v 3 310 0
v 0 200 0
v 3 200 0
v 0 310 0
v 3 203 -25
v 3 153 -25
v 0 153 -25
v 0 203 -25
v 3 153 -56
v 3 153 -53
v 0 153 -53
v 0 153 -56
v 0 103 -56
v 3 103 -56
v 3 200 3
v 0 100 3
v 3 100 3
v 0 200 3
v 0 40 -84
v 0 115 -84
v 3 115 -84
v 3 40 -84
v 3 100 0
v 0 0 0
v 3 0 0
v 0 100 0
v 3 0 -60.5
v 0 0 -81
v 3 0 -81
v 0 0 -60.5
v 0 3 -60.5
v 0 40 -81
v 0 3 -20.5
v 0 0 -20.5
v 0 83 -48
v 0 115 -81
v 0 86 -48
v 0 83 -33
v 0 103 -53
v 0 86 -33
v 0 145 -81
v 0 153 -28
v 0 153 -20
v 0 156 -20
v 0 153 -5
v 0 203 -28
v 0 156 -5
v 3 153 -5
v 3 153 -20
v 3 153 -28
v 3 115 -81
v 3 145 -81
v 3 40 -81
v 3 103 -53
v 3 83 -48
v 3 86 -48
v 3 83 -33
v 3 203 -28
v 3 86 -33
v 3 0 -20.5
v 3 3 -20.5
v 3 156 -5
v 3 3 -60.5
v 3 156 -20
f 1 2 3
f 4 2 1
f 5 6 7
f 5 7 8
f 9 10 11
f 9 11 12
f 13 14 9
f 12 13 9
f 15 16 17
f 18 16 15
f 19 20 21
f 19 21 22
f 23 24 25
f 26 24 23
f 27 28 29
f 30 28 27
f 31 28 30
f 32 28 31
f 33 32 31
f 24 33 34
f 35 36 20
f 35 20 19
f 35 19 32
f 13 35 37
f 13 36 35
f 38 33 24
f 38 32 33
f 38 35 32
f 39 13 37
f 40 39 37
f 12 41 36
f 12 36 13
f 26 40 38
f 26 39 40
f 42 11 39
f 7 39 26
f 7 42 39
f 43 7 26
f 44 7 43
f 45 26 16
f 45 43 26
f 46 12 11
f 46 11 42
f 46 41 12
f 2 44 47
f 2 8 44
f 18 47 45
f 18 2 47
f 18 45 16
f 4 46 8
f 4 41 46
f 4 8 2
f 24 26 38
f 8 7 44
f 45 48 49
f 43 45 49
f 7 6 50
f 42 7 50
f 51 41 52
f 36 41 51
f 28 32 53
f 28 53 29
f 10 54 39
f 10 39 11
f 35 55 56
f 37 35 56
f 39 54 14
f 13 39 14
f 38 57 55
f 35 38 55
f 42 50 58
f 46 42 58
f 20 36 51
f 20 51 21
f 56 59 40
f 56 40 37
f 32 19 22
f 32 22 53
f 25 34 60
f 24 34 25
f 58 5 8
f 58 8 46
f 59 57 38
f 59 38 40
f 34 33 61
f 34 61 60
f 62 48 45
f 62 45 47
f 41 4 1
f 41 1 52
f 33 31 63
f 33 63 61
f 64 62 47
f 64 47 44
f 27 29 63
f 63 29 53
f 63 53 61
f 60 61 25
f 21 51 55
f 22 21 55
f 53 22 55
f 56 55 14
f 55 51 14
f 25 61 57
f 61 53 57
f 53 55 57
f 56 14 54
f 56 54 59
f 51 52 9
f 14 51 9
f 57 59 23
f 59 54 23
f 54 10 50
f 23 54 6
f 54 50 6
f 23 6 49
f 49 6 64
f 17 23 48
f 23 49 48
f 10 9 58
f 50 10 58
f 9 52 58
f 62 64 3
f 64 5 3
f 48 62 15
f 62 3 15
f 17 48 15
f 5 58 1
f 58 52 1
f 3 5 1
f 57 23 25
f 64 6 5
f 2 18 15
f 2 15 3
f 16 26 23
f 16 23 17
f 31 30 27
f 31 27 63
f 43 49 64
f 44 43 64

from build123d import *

# Parameters (mm, degrees)
SALIENTE_EXTRUIR1_DEPTH = 3
CROQUIS2_W              = 3
CROQUIS2_H              = 50
CORTAR_EXTRUIR2_DEPTH   = 70
CROQUIS4_W              = 15
CROQUIS4_H              = 3
CORTAR_EXTRUIR3_DEPTH   = 3


with BuildPart() as part:
    # Croquis1 → Saliente-Extruir1 (new body)
    with BuildSketch(Plane(origin=(0, 0, 0), x_dir=(0, 0, -1), z_dir=(1, 0, 0))):
        Polygon((0, 0), (0, 100), (-3, 100), (-3, 200), (0, 200), (0, 310), (81, 145), (81, 115), (84, 115), (84, 40), (81, 40), (81, 0), (60.5, 0), (60.5, 3), (20.5, 3), (20.5, 0), align=None)
    extrude(amount=SALIENTE_EXTRUIR1_DEPTH)

    # Croquis2 → Cortar-Extruir2 (cut)
    with BuildSketch(Plane(origin=(3, 0, 0), x_dir=(0, 0, -1), z_dir=(1, 0, 0))):
        with Locations((26.5, 178)):
            Rectangle(CROQUIS2_W, CROQUIS2_H)
        with Locations((54.5, 128)):
            Rectangle(CROQUIS2_W, CROQUIS2_H)
    extrude(amount=-CORTAR_EXTRUIR2_DEPTH, mode=Mode.SUBTRACT)

    # Croquis4 → Cortar-Extruir3 (cut)
    with BuildSketch(Plane(origin=(3, 0, 0), x_dir=(0, 0, -1), z_dir=(1, 0, 0))):
        with Locations((12.5, 154.5)):
            Rectangle(CROQUIS4_W, CROQUIS4_H)
        with Locations((40.5, 84.5)):
            Rectangle(CROQUIS4_W, CROQUIS4_H)
    extrude(amount=-CORTAR_EXTRUIR3_DEPTH, mode=Mode.SUBTRACT)


solid = part.part
